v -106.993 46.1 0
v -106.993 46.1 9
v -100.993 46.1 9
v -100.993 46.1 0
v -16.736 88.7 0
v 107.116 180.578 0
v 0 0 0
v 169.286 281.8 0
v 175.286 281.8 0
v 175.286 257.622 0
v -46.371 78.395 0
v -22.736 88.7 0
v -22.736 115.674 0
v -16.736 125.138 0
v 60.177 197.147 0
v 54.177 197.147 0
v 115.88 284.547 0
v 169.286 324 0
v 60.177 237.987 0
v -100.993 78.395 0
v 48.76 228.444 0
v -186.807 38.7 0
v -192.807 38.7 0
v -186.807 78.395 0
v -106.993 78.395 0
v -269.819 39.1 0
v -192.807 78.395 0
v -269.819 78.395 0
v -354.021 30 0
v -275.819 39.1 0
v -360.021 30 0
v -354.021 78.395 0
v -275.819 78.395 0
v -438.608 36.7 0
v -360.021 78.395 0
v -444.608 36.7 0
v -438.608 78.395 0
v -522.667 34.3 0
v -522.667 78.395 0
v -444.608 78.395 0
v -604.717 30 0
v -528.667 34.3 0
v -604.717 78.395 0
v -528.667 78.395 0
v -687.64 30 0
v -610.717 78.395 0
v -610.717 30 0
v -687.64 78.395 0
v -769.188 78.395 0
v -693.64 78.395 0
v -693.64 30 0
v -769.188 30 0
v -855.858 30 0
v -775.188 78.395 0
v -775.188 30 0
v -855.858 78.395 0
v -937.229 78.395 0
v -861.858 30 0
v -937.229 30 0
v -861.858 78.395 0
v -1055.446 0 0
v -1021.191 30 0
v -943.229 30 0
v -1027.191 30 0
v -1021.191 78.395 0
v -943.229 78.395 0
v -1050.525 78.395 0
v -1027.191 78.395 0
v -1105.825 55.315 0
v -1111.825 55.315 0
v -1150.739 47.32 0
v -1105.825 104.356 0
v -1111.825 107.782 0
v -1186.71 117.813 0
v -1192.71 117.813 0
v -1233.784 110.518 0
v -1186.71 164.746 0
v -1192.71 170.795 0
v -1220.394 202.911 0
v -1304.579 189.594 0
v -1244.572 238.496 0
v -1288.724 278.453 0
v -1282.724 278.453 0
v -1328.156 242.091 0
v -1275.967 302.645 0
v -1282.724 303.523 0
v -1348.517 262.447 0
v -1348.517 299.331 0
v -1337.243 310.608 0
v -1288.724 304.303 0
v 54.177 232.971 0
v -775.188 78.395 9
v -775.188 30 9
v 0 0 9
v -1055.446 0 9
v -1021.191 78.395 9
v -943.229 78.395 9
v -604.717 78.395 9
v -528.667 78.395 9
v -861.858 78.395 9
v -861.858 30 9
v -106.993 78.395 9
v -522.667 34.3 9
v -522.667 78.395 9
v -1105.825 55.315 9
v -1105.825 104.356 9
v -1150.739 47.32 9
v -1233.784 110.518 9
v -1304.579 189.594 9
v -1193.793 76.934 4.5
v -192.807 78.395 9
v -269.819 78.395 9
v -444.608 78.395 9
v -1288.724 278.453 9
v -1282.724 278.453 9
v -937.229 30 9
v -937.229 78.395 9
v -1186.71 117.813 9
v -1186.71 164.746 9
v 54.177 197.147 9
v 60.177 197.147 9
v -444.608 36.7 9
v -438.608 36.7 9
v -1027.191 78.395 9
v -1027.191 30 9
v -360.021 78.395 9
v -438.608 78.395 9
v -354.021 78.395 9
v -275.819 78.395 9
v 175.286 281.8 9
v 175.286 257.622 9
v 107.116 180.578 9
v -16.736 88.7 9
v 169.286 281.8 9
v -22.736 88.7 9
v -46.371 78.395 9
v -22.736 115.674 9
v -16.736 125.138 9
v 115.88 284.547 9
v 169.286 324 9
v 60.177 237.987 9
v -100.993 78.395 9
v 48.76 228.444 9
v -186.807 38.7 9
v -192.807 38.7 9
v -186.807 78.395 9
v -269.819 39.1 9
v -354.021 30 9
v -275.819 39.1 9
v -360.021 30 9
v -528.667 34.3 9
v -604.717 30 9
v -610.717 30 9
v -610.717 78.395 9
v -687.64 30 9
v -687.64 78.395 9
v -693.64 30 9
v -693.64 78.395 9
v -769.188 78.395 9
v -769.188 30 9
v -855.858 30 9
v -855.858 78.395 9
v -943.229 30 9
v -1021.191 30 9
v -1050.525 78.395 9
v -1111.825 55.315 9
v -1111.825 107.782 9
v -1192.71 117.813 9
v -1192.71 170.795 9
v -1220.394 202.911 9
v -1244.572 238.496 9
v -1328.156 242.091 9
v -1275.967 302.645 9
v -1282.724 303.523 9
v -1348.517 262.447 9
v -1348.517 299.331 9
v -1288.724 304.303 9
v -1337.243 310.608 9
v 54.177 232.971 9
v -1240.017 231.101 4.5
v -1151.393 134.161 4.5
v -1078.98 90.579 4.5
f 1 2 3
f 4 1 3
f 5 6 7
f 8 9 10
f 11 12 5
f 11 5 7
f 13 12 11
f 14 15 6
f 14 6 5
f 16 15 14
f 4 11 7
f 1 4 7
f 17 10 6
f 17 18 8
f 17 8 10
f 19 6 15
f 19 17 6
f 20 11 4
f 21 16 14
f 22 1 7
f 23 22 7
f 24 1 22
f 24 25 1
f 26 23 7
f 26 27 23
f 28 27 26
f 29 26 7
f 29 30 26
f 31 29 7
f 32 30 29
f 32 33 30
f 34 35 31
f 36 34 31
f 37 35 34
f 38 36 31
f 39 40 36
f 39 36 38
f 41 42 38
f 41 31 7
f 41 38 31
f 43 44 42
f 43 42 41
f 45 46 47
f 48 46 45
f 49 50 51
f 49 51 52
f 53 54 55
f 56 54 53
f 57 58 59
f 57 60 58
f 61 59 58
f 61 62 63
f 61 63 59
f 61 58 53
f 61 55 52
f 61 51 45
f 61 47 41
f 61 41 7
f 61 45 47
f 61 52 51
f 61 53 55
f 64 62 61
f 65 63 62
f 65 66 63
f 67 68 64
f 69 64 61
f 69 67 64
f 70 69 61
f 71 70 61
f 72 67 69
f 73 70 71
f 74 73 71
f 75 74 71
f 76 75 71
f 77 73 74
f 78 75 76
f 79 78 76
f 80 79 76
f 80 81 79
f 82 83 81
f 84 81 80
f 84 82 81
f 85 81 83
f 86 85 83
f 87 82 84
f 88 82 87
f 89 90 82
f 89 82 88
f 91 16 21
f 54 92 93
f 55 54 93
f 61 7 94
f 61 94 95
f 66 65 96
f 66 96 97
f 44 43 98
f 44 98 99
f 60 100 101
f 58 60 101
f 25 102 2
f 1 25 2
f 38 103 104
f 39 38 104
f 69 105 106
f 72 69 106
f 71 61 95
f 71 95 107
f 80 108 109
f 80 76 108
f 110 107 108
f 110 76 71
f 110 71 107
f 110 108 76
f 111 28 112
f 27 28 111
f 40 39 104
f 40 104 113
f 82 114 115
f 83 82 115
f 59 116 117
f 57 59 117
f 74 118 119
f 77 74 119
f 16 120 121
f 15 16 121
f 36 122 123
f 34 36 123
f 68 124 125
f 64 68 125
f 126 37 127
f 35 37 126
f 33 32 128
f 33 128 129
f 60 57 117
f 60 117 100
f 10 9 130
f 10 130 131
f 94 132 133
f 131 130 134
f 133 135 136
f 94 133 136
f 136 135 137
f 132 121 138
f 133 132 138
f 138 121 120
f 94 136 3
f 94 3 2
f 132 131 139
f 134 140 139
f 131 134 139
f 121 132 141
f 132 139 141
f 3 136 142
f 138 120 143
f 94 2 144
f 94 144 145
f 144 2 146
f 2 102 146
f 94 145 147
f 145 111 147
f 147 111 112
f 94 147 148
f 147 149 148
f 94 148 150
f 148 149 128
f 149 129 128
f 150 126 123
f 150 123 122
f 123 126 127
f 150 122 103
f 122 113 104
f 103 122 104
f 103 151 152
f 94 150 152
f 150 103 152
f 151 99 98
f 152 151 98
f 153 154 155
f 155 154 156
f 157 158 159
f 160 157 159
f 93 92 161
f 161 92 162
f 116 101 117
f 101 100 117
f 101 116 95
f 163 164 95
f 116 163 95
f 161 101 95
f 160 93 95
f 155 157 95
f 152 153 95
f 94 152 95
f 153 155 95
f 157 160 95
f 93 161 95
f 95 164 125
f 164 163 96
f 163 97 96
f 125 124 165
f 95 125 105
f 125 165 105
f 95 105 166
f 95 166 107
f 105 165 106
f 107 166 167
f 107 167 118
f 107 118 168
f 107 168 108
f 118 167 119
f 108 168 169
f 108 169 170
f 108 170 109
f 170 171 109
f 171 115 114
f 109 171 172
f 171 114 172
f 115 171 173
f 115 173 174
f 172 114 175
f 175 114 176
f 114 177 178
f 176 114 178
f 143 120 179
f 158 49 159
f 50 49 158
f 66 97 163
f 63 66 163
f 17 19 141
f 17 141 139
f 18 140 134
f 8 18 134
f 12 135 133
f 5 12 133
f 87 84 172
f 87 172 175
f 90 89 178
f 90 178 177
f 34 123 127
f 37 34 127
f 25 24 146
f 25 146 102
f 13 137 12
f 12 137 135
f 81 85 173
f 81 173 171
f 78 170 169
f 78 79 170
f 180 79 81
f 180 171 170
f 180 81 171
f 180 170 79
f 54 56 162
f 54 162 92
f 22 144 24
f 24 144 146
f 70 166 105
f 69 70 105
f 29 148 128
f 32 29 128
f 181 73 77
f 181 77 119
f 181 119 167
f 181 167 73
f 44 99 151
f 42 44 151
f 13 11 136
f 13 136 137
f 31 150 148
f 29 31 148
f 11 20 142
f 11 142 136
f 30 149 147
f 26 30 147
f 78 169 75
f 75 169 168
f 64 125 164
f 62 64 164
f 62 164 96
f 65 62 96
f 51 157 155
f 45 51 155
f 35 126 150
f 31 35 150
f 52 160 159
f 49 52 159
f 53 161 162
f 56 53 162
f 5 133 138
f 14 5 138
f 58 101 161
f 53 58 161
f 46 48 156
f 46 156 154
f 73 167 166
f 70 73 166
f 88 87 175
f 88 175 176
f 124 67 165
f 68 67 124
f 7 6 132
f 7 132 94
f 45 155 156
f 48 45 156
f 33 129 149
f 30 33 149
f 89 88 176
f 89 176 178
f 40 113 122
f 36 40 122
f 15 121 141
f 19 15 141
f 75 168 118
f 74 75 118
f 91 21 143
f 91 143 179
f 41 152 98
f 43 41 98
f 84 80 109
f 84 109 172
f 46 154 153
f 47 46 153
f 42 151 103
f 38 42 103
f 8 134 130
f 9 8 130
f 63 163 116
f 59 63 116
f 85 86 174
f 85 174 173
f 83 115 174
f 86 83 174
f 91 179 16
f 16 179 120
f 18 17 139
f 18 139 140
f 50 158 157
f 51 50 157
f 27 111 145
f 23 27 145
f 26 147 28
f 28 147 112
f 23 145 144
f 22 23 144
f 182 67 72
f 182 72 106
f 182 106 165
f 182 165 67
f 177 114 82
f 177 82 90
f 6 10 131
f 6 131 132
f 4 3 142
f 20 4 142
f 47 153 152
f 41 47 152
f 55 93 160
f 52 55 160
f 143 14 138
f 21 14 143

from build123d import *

# Parameters (mm, degrees)
BOSS_EXTRU_2_DEPTH      = 9
ENL_V_MAT_EXTRU_2_DEPTH = 9
ESQUISSE5_W             = 6
ESQUISSE5_H             = 25.84965
ENL_V_MAT_EXTRU_3_DEPTH = 10


with BuildPart() as part:
    # Esquisse2 → Boss.-Extru.2 (new body)
    with BuildSketch(Plane.XY):
        with BuildLine():
            Line((0, 0), (-1055.446290734, 0))
            add(Edge.make_bspline(
                [(-1055.446290734, 0), (-1207.572733387, 59.072106031), (-1304.579199027, 189.593529265)],
                knots=[0, 0, 0, 1, 1, 1], degree=2))
            Line((-1304.579199027, 189.593529265), (-1328.155601237, 242.090877604))
            Line((-1328.155601237, 242.090877604), (-1348.517039509, 262.446992266))
            Line((-1348.517039509, 262.446992266), (-1348.517039509, 299.331021292))
            Line((-1348.517039509, 299.331021292), (-1337.24264668, 310.608362644))
            Line((-1337.24264668, 310.608362644), (-1275.966827179, 302.644588826))
            add(Edge.make_bspline(
                [(-1275.966827179, 302.644588826), (-1212.760641583, 141.531535954), (-1050.525159664, 78.394553502)],
                knots=[0, 0, 0, 1, 1, 1], degree=2))
            Line((-1050.525159664, 78.394553502), (-46.371074076, 78.394553502))
            Line((-46.371074076, 78.394553502), (48.76008987, 228.44376205))
            Line((48.76008987, 228.44376205), (115.880348206, 284.547364773))
            Line((115.880348206, 284.547364773), (175.286334456, 328.432610938))
            Line((175.286334456, 328.432610938), (175.286334456, 257.621549377))
            Line((175.286334456, 257.621549377), (107.11594567, 180.577636332))
            Line((107.11594567, 180.577636332), (0, 0))
        make_face()
    extrude(amount=BOSS_EXTRU_2_DEPTH)

    # Esquisse4 → Enlèv. mat.-Extru.2 (cut)
    with BuildSketch(Plane.XY.offset(9)):
        Polygon((-1192.710056644, 217.724215408), (-1192.710056644, 117.812636738), (-1186.710056644, 117.812636738), (-1186.710056644, 209.090265158), (-1144.70133954, 205.492785887), (-1111.824911273, 179.590935136), (-1111.824911273, 55.314515649), (-1105.824911273, 55.314515649), (-1105.824911273, 174.913937406), (-1058.771084869, 188.659470271), (-1027.191161845, 161.497477767), (-1027.191161845, 30), (-1021.191161845, 30), (-1021.191161845, 167.225098507), (-976.159938867, 174.429619005), (-943.229008237, 161.127659365), (-943.229008237, 30), (-937.229008237, 30), (-937.229008237, 164.093815562), (-899.191490776, 172.001101596), (-861.857811784, 160.098627493), (-861.857811784, 30), (-855.857811784, 30), (-855.857811784, 196.236545153), (-815.986169177, 204.901610664), (-775.188433973, 184.176190605), (-775.188433973, 30), (-769.188433973, 30), (-769.188433973, 176.450577912), (-732.223715867, 183.004336583), (-693.639593808, 163.215620457), (-693.639593808, 30), (-687.639593808, 30), (-687.639593808, 172.485228345), (-653.152535866, 182.871939208), (-610.716601792, 161.453305285), (-610.716601792, 30), (-604.716601792, 30), (-604.716601792, 256.125318922), (-551.321272632, 268.910222611), (-528.666744333, 255.862211449), (-528.666744333, 34.3), (-522.666744333, 34.3), (-522.666744333, 255.102102604), (-476.392141731, 269.107524931), (-444.607914754, 258.656296952), (-444.607914754, 36.7), (-438.607914754, 36.7), (-438.607914754, 253.443093933), (-391.056155042, 266.894918017), (-360.02126631, 254.206439852), (-360.02126631, 30), (-354.02126631, 30), (-354.02126631, 250.104032237), (-303.804875297, 262.547483763), (-275.81856885, 247.243298089), (-275.81856885, 39.1), (-269.81856885, 39.1), (-269.81856885, 230.071554094), (-217.437093626, 257.378680484), (-192.806508582, 246.762372601), (-192.806508582, 38.7), (-186.806508582, 38.7), (-186.806508582, 245.622867868), (-134.999273909, 264.79720393), (-106.993498927, 255.334085011), (-106.993498927, 46.1), (-100.993498927, 46.1), (-100.993498927, 258.655280604), (-22.735685337, 264.839286488), (-22.735685337, 88.7), (-16.735685337, 88.7), (-16.735685337, 231.395876397), (-1.733463181, 266.202092714), (54.176868866, 313.052154508), (54.176868866, 197.147050424), (60.176868866, 197.147050424), (60.176868866, 330.337520125), (-1075.947973634, 334.662873451), align=None)
    extrude(amount=-ENL_V_MAT_EXTRU_2_DEPTH, mode=Mode.SUBTRACT)

    # Esquisse5 → Enlèv. mat.-Extru.3 (cut)
    with BuildSketch(Plane.XY.offset(9)):
        Polygon((169.286334456, 324.000204482), (169.286334456, 281.800204482), (175.286334456, 281.800204482), (202.680394495, 285.052171219), (208.588297758, 339.079823363), (181.275473189, 338.718158681), align=None)
        with Locations((-1285.723549311, 291.377704112)):
            Rectangle(ESQUISSE5_W, ESQUISSE5_H)
    extrude(amount=-ENL_V_MAT_EXTRU_3_DEPTH, mode=Mode.SUBTRACT)


solid = part.part
